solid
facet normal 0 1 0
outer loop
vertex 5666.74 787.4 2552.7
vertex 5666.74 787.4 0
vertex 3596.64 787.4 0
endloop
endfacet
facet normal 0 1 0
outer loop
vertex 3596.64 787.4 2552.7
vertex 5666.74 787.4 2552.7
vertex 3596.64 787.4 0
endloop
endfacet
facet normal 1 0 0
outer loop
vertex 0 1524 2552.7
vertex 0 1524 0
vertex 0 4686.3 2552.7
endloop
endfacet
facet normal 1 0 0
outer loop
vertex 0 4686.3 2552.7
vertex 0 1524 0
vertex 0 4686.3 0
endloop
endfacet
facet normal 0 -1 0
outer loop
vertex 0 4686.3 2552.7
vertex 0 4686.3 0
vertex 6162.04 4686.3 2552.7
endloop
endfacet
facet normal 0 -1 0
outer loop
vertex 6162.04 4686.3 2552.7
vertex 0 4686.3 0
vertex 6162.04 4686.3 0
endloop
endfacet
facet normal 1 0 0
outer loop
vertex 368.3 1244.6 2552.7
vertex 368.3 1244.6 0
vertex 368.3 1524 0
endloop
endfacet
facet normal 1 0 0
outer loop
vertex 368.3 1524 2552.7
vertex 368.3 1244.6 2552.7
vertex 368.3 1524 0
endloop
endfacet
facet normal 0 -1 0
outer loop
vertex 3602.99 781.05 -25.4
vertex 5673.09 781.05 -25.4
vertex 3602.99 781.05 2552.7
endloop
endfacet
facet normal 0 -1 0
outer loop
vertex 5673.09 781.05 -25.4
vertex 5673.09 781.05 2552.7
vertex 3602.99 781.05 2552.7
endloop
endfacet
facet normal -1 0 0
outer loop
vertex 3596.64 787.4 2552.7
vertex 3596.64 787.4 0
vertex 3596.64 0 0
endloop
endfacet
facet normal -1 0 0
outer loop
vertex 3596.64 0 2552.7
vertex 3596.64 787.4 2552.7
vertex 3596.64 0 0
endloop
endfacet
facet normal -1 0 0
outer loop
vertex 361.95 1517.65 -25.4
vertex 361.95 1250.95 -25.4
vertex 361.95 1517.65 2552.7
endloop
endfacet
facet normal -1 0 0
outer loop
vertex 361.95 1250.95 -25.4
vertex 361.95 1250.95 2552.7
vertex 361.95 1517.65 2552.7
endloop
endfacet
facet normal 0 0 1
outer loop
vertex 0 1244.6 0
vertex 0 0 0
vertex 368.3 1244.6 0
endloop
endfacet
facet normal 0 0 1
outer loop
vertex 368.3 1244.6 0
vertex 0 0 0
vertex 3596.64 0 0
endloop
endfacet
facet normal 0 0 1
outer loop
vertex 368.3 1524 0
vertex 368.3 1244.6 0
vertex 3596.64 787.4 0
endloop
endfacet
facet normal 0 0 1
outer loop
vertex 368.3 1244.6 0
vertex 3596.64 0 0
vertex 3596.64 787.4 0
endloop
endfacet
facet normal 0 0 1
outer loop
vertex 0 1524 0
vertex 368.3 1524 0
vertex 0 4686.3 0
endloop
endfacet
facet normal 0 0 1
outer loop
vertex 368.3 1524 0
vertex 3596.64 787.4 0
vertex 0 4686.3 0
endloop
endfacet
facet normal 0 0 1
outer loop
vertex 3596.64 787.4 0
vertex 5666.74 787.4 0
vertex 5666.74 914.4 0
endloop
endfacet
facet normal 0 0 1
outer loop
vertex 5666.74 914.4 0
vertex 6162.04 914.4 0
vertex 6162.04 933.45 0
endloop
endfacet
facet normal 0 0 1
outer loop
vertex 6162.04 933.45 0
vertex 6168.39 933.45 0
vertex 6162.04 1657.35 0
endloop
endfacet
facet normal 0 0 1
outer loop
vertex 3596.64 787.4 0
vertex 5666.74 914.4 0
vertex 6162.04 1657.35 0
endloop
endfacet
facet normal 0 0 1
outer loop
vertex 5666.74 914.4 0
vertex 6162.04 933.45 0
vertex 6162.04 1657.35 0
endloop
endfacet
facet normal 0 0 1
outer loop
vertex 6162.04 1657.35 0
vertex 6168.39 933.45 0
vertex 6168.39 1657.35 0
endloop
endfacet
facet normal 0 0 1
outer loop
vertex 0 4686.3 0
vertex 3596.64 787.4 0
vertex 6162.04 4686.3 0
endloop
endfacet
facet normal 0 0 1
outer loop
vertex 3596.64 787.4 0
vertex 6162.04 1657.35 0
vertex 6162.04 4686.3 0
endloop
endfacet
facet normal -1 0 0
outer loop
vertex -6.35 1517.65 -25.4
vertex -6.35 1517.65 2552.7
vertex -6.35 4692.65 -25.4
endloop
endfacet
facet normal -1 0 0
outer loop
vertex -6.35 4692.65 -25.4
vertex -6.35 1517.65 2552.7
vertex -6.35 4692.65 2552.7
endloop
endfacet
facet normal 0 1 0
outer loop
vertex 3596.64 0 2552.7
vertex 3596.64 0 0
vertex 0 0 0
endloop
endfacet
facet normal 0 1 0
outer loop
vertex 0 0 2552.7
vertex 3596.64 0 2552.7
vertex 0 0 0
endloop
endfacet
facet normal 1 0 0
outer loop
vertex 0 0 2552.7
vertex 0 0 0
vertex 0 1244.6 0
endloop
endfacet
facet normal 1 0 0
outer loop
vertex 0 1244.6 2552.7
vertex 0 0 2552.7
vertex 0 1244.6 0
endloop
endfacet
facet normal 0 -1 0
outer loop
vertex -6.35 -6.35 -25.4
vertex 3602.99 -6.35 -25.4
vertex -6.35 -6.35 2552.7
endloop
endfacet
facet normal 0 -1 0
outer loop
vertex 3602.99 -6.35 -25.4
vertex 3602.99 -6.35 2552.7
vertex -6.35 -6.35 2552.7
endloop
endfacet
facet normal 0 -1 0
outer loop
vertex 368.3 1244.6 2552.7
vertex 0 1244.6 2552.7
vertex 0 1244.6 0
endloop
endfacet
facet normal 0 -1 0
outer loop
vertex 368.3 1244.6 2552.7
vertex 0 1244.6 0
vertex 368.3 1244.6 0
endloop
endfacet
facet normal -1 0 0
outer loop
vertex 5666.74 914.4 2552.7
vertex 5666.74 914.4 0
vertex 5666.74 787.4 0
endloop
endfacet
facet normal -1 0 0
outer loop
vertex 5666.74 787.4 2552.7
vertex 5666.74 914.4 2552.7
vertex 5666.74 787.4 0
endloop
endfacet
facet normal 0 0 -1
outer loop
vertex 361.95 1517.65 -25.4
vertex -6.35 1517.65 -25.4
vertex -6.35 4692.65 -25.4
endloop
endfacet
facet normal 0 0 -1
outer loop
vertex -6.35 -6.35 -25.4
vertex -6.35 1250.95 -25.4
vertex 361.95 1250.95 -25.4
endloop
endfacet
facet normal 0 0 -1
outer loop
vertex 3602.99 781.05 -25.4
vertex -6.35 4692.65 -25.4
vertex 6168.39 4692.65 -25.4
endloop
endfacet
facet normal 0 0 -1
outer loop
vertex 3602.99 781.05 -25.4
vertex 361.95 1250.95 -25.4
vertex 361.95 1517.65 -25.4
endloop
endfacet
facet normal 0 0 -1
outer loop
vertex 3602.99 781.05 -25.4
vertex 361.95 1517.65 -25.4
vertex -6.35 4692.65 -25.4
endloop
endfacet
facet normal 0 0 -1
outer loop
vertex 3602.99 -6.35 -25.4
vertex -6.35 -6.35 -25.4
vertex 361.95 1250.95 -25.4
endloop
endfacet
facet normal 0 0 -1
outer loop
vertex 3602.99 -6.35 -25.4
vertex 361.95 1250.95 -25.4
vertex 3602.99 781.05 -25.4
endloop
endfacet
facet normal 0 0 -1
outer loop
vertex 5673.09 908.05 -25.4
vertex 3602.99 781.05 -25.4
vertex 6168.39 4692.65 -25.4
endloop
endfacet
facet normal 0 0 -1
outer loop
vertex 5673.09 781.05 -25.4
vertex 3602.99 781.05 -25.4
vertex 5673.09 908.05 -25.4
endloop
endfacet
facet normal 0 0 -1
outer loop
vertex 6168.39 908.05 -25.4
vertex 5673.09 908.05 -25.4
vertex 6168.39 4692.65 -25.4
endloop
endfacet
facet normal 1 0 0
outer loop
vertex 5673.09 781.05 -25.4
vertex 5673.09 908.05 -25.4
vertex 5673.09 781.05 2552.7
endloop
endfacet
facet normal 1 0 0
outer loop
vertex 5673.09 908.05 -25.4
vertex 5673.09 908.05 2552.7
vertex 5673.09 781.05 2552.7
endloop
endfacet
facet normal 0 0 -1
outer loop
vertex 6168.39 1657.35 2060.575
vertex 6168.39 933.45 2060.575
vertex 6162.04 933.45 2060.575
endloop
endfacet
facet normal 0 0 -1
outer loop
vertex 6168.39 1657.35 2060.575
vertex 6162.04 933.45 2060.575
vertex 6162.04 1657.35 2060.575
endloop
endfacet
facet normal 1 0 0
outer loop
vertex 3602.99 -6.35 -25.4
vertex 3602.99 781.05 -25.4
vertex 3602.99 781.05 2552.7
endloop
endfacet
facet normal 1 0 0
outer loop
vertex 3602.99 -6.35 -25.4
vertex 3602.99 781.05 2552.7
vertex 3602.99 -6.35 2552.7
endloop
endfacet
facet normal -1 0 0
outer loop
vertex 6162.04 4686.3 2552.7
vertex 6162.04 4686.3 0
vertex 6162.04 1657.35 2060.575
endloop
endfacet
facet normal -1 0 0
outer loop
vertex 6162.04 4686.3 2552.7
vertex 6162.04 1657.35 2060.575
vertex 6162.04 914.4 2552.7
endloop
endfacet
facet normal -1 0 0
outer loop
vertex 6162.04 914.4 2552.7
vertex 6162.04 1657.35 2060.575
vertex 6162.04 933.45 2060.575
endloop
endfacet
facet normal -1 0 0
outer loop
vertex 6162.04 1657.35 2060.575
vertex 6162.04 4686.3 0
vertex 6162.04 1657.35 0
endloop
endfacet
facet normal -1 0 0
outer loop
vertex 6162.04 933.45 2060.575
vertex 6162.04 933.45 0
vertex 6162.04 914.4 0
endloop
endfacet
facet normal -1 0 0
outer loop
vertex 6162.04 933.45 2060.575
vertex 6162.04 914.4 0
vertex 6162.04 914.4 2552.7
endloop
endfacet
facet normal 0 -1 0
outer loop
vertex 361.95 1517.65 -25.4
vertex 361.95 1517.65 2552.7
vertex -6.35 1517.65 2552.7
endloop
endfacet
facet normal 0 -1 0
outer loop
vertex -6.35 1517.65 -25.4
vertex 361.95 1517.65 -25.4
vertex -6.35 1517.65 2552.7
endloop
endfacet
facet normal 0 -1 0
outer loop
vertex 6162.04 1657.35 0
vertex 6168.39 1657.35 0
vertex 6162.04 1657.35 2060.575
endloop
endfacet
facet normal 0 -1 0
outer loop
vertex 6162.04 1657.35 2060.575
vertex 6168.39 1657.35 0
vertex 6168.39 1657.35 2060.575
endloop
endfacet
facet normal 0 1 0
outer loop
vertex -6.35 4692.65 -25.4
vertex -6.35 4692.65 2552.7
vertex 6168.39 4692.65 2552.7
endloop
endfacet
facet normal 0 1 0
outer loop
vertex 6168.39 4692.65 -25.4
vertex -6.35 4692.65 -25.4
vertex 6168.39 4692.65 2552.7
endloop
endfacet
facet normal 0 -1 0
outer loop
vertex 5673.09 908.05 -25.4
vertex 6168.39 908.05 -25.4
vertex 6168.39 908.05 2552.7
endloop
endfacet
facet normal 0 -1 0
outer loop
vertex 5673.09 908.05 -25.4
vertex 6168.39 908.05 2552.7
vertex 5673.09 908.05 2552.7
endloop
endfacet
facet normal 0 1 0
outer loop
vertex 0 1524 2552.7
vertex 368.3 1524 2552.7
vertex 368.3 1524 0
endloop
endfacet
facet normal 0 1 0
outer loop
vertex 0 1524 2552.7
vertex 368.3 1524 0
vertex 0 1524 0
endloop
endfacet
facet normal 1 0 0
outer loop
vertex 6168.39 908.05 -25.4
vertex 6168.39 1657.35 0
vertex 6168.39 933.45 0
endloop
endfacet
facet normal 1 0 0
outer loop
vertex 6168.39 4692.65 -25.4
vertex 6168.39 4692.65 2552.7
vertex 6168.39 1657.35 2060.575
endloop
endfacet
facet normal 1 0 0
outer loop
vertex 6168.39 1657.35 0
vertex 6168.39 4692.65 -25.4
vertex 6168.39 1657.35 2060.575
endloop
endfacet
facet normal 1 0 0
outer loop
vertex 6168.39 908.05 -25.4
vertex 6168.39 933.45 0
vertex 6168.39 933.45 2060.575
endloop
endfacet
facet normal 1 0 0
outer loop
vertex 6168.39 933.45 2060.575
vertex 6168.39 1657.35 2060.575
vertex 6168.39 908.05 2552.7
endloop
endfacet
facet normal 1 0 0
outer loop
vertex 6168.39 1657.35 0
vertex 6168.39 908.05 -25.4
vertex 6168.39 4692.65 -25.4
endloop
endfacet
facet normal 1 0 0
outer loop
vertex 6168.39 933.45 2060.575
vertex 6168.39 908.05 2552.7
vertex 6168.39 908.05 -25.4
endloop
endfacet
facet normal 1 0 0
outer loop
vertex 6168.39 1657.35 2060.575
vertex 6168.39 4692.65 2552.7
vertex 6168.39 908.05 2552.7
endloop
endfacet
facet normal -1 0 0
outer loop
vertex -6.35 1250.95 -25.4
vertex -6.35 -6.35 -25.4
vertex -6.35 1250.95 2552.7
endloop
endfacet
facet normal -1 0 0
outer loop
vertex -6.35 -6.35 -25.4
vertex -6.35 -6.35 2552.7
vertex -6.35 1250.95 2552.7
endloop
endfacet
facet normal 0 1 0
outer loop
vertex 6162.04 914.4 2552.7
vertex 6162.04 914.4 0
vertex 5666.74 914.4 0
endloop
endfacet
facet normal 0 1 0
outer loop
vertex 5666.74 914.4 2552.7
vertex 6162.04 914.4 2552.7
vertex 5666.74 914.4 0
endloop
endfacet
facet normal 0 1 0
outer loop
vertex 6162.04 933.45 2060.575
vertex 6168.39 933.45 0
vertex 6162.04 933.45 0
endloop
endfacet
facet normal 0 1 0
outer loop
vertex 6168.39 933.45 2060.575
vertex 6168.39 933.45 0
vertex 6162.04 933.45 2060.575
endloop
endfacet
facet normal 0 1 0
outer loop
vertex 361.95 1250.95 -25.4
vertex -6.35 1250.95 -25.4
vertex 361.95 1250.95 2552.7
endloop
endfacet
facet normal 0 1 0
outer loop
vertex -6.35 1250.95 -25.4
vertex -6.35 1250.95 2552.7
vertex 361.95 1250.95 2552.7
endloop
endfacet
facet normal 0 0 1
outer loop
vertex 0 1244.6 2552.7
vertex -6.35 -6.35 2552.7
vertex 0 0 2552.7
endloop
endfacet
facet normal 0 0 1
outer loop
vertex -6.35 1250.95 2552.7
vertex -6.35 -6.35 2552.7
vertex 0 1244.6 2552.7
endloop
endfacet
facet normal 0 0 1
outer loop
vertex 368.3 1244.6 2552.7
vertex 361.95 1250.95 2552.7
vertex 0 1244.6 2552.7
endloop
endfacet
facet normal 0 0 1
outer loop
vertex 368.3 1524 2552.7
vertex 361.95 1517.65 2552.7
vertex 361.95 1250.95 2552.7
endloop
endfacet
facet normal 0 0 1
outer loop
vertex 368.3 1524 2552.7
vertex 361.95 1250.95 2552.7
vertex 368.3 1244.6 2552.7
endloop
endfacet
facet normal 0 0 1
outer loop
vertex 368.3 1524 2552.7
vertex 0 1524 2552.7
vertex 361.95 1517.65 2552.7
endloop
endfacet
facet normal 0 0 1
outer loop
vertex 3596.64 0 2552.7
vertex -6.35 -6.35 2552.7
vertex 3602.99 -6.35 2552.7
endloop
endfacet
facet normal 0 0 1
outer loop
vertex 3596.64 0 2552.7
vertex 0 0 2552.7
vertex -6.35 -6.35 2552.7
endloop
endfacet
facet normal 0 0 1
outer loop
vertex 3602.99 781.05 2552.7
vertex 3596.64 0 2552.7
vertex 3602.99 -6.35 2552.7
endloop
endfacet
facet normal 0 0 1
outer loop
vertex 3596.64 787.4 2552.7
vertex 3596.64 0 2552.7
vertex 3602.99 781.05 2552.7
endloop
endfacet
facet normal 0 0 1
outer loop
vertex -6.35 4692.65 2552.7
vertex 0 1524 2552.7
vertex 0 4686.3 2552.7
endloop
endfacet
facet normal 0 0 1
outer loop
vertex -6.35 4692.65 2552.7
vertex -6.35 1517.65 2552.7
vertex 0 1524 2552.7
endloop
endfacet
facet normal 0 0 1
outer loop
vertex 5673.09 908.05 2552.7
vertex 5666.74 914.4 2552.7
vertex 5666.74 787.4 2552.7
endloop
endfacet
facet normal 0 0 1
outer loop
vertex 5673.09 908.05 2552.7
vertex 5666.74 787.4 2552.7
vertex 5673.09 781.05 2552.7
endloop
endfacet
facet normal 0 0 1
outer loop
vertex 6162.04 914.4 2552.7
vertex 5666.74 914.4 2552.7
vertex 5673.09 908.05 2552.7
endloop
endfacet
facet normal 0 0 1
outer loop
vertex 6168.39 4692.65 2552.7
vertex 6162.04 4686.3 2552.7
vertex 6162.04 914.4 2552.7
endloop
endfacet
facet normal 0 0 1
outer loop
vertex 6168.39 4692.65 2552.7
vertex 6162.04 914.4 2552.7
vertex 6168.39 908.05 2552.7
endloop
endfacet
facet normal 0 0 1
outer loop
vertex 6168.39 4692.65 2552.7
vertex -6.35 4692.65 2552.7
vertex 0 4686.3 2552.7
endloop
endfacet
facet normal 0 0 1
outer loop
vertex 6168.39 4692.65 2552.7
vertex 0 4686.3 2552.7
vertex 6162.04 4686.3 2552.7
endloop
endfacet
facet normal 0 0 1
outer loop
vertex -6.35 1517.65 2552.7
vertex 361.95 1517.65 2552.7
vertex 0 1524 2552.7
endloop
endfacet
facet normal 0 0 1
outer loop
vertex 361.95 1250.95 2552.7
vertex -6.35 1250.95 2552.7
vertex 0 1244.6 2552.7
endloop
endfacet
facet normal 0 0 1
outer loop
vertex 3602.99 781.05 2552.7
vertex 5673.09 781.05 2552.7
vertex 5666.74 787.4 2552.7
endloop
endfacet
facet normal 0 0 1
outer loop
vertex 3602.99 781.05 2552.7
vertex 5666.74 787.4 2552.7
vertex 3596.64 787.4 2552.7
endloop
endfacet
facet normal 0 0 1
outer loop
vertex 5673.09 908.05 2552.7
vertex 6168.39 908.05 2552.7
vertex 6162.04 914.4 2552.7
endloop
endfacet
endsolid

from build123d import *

# Parameters (mm, degrees)
F1_DEPTH = 2552.7
F3_DEPTH = 25.4
F4_W     = 723.9
F4_H     = 2060.575
F5_DEPTH = 6.35


with BuildPart() as f1:
    # F0 (on Top) → F1 (new body)
    with BuildSketch(Plane.XY):
        Polygon((6168.39, 908.05), (6168.39, 4692.65), (-6.35, 4692.65), (-6.35, 1517.65), (361.95, 1517.65), (361.95, 1250.95), (-6.35, 1250.95), (-6.35, -6.35), (3602.99, -6.35), (3602.99, 781.05), (5673.09, 781.05), (5673.09, 908.05), align=None)
        Polygon((3596.64, 0), (0, 0), (0, 1244.6), (368.3, 1244.6), (368.3, 1524), (0, 1524), (0, 4686.3), (6162.04, 4686.3), (6162.04, 914.4), (5666.74, 914.4), (5666.74, 787.4), (3596.64, 787.4), align=None, mode=Mode.SUBTRACT)
    extrude(amount=F1_DEPTH)

    # F2 (on face) → F3 (join)
    with BuildSketch(Plane(origin=(0, 0, 0), x_dir=(1, 0, 0), z_dir=(0, 0, -1))):
        Polygon((-6.35, -4692.65), (6168.39, -4692.65), (6168.39, -908.05), (5673.09, -908.05), (5673.09, -781.05), (3602.99, -781.05), (3602.99, 6.35), (-6.35, 6.35), (-6.35, -1250.95), (361.95, -1250.95), (361.95, -1517.65), (-6.35, -1517.65), align=None)
    extrude(amount=F3_DEPTH)

    # F4 (on face) → F5 (cut, through all)
    with BuildSketch(Plane.YZ.offset(6168.39)):
        with Locations((1295.4, 1030.2875)):
            Rectangle(F4_W, F4_H)
    extrude(amount=-F5_DEPTH, mode=Mode.SUBTRACT)


solid = f1.part
